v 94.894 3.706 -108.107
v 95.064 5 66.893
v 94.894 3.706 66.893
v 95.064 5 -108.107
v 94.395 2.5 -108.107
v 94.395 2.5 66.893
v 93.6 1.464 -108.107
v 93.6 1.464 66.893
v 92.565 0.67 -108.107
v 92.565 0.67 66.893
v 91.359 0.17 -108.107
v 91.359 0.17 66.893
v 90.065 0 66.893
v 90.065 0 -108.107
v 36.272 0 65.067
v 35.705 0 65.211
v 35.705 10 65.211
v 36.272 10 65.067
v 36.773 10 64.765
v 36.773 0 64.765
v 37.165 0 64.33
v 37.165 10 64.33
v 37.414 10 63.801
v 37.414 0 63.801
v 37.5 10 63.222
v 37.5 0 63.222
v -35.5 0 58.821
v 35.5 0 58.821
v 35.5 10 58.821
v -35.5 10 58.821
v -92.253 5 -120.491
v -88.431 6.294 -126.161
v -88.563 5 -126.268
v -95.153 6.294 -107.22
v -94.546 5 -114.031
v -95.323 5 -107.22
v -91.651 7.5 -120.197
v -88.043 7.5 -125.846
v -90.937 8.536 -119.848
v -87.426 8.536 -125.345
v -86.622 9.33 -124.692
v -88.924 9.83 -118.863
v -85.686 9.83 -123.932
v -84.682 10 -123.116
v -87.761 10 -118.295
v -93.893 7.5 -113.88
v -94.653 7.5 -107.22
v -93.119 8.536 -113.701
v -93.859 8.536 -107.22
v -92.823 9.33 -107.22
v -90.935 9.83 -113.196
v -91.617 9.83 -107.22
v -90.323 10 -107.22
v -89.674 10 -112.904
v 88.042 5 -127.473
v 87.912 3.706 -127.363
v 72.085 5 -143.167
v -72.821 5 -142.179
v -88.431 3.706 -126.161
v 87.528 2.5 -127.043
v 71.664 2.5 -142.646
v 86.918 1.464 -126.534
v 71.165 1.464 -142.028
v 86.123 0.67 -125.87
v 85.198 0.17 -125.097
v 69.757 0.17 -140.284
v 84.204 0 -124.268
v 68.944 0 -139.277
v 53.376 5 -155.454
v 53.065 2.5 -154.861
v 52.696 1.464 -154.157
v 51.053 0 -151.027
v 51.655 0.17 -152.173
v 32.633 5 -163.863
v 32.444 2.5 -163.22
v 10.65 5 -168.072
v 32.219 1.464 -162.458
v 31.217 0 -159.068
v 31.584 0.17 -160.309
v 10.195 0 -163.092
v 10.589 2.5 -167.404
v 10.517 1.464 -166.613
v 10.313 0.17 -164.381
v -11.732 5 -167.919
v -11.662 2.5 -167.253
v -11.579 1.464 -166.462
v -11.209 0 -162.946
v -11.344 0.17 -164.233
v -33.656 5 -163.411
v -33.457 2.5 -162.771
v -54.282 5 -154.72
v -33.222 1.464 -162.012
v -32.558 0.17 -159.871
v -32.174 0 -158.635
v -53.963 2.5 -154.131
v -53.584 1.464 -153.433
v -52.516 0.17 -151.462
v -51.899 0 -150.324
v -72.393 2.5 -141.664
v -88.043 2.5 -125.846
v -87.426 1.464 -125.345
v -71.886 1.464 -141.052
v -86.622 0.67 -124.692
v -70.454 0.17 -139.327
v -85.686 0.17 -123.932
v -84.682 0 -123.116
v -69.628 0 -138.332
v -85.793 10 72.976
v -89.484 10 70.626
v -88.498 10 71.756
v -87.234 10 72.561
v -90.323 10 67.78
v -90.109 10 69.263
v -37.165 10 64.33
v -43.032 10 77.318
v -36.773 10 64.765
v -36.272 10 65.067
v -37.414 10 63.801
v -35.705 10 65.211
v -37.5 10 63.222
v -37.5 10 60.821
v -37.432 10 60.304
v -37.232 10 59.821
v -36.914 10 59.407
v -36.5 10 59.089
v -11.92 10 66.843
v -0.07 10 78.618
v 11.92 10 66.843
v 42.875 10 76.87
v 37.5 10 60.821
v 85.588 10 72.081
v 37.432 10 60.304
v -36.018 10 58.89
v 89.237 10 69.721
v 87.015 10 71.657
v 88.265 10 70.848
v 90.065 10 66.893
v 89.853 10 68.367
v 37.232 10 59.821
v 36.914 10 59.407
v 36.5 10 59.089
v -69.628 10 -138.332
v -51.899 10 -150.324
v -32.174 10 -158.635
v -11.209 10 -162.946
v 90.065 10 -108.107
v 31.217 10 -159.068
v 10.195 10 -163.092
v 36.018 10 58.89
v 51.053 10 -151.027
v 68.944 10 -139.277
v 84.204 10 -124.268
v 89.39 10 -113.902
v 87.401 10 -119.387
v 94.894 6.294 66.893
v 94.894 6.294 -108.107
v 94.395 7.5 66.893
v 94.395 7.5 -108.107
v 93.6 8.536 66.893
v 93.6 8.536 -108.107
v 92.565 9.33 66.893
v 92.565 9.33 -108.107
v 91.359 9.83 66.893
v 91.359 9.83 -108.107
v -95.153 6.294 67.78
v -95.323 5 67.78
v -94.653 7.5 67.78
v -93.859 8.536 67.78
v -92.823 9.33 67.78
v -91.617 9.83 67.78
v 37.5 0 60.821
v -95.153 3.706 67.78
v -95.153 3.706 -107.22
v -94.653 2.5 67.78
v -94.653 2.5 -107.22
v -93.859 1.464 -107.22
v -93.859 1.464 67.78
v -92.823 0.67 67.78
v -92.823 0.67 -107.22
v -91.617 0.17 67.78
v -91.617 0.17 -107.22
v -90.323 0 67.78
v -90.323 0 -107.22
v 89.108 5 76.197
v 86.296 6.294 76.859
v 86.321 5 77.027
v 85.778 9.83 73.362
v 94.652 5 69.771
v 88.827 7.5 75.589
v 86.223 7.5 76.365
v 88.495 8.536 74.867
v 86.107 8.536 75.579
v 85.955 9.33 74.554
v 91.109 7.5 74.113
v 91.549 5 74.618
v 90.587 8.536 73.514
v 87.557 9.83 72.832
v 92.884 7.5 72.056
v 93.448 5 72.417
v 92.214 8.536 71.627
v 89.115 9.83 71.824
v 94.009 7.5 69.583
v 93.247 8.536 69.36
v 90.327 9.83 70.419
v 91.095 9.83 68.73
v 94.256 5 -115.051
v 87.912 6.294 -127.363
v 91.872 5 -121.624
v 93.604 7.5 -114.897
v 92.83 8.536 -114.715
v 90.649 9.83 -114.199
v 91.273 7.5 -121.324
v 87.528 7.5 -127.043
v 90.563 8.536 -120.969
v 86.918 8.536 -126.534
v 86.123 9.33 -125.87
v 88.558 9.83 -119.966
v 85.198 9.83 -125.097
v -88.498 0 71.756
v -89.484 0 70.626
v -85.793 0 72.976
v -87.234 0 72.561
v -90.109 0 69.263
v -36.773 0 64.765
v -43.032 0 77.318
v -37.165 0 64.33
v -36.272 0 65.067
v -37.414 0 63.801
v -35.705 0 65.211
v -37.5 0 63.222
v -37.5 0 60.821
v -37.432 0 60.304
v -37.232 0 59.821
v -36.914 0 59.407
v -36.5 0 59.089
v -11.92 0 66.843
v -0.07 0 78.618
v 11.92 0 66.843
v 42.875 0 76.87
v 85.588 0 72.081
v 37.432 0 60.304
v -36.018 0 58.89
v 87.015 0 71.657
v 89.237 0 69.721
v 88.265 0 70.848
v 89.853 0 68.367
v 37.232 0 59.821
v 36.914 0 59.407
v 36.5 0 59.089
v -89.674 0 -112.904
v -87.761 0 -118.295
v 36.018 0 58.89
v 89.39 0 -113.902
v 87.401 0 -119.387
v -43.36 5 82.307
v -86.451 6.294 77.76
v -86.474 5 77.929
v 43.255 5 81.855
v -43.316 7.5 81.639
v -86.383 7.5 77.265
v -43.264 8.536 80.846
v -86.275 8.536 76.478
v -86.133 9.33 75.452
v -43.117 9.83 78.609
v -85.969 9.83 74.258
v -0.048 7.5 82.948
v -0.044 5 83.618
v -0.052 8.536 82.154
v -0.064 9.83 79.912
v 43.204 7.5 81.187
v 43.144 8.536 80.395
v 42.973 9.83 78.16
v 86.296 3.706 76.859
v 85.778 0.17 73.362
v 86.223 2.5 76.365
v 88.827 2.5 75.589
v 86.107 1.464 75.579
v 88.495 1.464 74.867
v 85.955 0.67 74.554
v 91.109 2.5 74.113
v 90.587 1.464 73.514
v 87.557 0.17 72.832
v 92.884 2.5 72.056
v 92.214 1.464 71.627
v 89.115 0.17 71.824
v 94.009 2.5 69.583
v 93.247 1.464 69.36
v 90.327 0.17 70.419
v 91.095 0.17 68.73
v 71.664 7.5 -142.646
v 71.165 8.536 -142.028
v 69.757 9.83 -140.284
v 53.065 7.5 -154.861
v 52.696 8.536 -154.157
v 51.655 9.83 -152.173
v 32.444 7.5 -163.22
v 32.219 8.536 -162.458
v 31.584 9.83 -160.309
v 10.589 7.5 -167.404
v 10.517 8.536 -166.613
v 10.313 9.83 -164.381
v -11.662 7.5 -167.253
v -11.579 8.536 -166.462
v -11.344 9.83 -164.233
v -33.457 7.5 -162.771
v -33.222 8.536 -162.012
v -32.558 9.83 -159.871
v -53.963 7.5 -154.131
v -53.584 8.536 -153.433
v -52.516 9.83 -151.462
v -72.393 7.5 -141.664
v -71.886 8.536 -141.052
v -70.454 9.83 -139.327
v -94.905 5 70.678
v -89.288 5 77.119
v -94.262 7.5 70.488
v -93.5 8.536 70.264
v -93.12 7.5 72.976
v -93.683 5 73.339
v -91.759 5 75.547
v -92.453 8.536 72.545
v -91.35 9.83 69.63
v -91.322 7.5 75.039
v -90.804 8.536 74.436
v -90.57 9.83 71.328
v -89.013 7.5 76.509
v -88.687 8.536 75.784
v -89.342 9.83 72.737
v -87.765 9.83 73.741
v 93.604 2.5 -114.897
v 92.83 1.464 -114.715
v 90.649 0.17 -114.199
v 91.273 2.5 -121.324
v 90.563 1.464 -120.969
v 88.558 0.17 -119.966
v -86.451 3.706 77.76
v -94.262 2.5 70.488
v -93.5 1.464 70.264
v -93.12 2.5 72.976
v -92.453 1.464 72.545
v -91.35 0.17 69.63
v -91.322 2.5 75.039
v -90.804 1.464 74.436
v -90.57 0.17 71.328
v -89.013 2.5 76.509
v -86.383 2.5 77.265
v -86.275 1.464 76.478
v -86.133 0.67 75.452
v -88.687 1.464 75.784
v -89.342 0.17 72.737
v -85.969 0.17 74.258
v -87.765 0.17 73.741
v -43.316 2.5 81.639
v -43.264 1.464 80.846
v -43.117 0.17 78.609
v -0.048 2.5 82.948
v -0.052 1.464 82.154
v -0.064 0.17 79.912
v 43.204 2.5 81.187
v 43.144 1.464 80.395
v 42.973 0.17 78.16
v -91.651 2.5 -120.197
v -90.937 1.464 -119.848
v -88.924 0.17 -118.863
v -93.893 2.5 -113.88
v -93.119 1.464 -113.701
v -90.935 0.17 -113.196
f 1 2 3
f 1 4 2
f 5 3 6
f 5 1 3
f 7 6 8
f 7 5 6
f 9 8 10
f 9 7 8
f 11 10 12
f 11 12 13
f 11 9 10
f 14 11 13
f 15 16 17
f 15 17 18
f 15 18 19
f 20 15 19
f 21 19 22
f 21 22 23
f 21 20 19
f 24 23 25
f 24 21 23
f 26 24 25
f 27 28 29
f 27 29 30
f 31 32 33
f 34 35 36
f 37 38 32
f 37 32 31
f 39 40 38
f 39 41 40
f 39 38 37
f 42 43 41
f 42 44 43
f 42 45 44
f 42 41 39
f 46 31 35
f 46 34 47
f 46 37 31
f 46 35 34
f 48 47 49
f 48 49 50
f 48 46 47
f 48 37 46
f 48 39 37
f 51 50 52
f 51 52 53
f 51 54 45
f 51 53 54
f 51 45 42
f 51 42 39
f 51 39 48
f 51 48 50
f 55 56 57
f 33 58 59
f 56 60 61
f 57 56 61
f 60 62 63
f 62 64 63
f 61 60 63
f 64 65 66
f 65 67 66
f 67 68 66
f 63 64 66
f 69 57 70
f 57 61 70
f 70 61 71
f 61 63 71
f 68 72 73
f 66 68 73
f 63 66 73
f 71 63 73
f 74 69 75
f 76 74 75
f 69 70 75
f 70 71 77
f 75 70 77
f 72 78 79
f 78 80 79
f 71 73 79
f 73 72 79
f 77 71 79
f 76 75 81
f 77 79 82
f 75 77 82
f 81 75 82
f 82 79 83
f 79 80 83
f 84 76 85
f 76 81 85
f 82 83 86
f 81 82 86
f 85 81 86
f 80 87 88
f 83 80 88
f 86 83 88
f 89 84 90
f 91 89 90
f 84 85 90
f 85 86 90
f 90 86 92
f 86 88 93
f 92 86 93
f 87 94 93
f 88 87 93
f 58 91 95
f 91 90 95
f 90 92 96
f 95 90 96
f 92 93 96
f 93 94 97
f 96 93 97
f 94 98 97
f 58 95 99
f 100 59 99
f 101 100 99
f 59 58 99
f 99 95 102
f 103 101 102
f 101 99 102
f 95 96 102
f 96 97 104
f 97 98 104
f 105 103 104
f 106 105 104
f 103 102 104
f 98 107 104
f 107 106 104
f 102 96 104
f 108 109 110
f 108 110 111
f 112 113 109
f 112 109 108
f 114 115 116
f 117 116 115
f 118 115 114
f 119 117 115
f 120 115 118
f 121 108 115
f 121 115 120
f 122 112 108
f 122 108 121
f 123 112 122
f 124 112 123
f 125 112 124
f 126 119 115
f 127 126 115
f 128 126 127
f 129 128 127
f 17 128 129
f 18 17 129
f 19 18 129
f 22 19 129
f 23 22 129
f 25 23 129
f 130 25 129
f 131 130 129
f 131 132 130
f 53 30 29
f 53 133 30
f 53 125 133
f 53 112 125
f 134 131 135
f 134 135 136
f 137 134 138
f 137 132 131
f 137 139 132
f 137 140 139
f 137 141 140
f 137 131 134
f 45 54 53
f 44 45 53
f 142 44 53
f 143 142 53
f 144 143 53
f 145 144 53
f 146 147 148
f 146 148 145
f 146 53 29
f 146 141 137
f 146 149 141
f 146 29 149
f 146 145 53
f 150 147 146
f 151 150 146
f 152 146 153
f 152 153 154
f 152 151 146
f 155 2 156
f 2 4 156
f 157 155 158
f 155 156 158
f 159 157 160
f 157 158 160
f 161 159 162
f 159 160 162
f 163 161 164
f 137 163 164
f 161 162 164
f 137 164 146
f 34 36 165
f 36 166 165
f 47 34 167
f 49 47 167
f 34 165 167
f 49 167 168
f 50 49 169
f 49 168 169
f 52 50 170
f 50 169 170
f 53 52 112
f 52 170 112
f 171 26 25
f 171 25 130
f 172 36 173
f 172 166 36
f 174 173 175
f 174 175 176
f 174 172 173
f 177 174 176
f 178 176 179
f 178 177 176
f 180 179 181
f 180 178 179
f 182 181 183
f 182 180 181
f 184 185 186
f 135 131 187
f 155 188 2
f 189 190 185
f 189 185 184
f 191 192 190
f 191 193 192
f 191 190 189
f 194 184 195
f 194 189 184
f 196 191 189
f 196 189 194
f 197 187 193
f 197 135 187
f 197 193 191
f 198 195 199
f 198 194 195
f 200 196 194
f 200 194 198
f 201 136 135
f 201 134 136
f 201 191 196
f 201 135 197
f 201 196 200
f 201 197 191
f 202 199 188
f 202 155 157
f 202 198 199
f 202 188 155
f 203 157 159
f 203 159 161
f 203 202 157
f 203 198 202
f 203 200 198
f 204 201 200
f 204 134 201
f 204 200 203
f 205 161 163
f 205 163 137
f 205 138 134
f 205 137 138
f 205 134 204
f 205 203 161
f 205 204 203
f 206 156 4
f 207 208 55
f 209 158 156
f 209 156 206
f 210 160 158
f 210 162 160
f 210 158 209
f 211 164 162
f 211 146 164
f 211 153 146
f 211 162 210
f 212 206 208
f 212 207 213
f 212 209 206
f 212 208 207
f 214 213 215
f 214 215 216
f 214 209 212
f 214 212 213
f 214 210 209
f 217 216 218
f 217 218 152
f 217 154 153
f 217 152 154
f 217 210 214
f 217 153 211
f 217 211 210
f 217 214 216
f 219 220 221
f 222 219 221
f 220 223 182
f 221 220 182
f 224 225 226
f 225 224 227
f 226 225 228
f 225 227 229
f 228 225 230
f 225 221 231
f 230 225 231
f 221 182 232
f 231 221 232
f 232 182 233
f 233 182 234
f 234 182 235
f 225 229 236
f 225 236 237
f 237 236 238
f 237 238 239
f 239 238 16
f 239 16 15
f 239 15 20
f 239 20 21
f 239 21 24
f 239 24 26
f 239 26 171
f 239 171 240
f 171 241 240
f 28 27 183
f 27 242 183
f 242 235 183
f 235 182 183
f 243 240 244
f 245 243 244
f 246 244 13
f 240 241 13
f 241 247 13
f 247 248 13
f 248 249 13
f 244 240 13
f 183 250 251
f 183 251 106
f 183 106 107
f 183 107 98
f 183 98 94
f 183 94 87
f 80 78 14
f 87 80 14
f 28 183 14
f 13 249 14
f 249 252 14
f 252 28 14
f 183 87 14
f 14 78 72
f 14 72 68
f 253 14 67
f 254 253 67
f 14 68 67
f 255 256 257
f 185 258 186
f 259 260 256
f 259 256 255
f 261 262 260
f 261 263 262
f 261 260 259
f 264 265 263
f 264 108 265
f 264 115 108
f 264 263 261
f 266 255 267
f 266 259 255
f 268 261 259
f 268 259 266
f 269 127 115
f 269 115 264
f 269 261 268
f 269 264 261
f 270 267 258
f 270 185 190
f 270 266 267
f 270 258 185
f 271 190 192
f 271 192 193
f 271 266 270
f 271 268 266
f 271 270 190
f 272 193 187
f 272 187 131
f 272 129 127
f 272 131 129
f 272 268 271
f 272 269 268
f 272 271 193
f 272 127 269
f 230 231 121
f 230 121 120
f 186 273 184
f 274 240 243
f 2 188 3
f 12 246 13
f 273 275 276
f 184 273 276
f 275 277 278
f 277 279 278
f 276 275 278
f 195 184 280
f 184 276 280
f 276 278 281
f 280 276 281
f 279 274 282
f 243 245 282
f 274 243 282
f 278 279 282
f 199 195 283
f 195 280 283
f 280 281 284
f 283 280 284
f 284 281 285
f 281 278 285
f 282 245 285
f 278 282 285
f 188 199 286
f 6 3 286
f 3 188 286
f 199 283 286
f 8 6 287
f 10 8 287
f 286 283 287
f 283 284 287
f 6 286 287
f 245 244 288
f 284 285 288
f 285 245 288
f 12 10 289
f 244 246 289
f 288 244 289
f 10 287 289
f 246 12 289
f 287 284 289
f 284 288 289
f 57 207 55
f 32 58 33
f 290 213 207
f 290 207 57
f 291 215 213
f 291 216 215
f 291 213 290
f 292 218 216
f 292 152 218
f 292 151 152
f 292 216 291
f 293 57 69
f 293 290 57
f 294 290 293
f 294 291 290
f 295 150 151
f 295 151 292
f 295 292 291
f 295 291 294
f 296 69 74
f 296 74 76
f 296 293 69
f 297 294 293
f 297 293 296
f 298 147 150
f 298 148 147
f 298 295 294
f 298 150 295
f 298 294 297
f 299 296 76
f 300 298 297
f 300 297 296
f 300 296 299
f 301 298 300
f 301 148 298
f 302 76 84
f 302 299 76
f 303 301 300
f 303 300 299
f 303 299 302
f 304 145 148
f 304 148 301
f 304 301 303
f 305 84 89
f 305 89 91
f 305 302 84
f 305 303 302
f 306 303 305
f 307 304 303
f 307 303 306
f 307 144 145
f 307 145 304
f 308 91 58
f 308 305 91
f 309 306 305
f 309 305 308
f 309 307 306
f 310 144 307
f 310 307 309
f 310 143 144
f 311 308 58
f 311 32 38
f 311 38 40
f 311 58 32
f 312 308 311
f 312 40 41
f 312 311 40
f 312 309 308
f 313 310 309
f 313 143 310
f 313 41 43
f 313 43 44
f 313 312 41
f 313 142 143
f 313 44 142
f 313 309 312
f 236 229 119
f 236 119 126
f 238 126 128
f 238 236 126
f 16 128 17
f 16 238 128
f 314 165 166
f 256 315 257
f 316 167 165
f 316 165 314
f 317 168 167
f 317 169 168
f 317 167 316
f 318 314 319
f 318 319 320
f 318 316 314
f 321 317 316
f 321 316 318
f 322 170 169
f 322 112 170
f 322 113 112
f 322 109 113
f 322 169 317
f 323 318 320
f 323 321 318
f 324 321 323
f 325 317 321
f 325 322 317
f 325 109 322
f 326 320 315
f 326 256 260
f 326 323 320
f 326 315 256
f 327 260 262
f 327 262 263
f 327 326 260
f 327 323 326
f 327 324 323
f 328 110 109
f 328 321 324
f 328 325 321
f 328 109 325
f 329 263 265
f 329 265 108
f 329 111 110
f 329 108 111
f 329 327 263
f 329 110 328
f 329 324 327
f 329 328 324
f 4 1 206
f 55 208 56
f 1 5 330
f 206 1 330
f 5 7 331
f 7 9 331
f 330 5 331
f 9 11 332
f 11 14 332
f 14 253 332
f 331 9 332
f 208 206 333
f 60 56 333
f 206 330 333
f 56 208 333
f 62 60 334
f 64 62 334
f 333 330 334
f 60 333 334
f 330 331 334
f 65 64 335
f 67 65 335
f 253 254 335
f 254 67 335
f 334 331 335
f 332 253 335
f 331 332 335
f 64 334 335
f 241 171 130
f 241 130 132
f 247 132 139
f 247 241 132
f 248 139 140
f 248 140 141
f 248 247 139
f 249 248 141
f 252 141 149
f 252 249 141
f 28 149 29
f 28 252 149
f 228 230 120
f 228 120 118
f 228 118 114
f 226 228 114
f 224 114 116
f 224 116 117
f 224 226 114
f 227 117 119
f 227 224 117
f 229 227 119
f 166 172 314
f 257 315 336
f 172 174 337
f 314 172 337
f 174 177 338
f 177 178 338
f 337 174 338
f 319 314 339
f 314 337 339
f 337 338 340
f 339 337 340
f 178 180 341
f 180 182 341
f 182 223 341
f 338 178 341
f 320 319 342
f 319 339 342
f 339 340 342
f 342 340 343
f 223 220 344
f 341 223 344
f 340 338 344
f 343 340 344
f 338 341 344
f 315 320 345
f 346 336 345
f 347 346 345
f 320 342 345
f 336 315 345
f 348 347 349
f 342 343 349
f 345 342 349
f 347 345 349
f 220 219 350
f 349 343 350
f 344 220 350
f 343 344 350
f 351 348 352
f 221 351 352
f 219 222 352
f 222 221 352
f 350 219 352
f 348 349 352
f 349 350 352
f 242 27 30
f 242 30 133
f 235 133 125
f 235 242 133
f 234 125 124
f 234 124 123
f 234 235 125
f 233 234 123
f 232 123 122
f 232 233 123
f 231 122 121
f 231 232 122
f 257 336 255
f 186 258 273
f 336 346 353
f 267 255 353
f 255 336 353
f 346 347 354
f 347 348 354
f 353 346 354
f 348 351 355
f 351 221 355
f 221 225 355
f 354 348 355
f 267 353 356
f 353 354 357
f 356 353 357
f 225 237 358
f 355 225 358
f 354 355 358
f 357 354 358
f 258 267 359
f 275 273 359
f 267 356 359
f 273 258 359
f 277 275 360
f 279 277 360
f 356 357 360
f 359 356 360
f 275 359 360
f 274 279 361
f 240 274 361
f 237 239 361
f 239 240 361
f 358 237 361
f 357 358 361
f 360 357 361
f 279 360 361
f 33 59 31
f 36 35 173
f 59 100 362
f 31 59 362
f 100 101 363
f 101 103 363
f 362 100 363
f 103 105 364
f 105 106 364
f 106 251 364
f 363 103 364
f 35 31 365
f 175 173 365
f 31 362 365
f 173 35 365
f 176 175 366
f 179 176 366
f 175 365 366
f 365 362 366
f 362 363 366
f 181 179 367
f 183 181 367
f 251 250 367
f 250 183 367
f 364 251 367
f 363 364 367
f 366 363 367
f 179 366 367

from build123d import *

# Parameters (mm, degrees)
BOSS_EXTRUDE1_DEPTH = 10
FILLET1_R           = 5


with BuildPart() as part:
    # Sketch1 → Boss-Extrude1 (new body)
    with BuildSketch(Plane(origin=(0, 0, 0), x_dir=(1, 0, 0), z_dir=(0, 1, 0))):
        with BuildLine():
            Line((95.064475679, -66.893222563), (95.064480767, 108.106777437))
            ThreePointArc((95.064480767, 108.106777437), (93.254744528, 118.406620299), (88.04232554, 127.472633565))
            ThreePointArc((88.04232554, 127.472633565), (-0.544574451, 168.543910176), (-88.562996968, 126.268078898))
            ThreePointArc((-88.562996968, 126.268078898), (-93.583004489, 117.32624486), (-95.323148669, 107.220366882))
            Line((-95.323148669, 107.220366882), (-95.323030776, -67.779633118))
            ThreePointArc((-95.323030776, -67.779633118), (-92.800151785, -74.512215926), (-86.474089698, -77.92887045))
            ThreePointArc((-86.474089698, -77.92887045), (-0.044332377, -83.617951425), (86.321358486, -77.027349436))
            ThreePointArc((86.321358486, -77.027349436), (92.576619033, -73.585431127), (95.064475679, -66.893222563))
        make_face()
        with BuildLine():
            Line((35.5, -58.821440939), (-35.5, -58.821440939))
            ThreePointArc((-35.5, -58.821440939), (-36.914213562, -59.407227376), (-37.5, -60.821440939))
            Line((-37.5, -60.821440939), (-37.5, -63.222008463))
            ThreePointArc((-37.5, -63.222008463), (-36.98495569, -64.561749706), (-35.705093402, -65.211464845))
            ThreePointArc((-35.705093402, -65.211464845), (0, -67.047022968), (35.705093402, -65.211464845))
            ThreePointArc((35.705093402, -65.211464845), (36.98495569, -64.561749706), (37.5, -63.222008463))
            Line((37.5, -63.222008463), (37.5, -60.821440939))
            ThreePointArc((37.5, -60.821440939), (36.914213562, -59.407227376), (35.5, -58.821440939))
        make_face(mode=Mode.SUBTRACT)
    extrude(amount=BOSS_EXTRUDE1_DEPTH)

    # Fillet1
    fillet1_edges = [part.edges().sort_by_distance(p)[0] for p in [
        (92.576619033, 10, 73.585431127),
        (-0.044332377, 10, 83.617951425),
        (-92.800151785, 10, 74.512215926),
        (-95.323089722, 10, -19.720366882),
        (-93.583004489, 10, -117.32624486),
        (-0.544574451, 10, -168.543910176),
        (93.254744528, 10, -118.406620299),
        (92.576619033, 0, 73.585431127),
        (-0.044332377, 0, 83.617951425),
        (-92.800151785, 0, 74.512215926),
        (-95.323089722, 0, -19.720366882),
        (-93.583004489, 0, -117.32624486),
        (-0.544574451, 0, -168.543910176),
        (93.254744528, 0, -118.406620299),
        (95.064478223, 10, -20.606777437),
        (95.064478223, 0, -20.606777437),
    ]]
    fillet(fillet1_edges, radius=FILLET1_R - 0.0001)  # a hair under: the kernel refuses the full size


solid = part.part
